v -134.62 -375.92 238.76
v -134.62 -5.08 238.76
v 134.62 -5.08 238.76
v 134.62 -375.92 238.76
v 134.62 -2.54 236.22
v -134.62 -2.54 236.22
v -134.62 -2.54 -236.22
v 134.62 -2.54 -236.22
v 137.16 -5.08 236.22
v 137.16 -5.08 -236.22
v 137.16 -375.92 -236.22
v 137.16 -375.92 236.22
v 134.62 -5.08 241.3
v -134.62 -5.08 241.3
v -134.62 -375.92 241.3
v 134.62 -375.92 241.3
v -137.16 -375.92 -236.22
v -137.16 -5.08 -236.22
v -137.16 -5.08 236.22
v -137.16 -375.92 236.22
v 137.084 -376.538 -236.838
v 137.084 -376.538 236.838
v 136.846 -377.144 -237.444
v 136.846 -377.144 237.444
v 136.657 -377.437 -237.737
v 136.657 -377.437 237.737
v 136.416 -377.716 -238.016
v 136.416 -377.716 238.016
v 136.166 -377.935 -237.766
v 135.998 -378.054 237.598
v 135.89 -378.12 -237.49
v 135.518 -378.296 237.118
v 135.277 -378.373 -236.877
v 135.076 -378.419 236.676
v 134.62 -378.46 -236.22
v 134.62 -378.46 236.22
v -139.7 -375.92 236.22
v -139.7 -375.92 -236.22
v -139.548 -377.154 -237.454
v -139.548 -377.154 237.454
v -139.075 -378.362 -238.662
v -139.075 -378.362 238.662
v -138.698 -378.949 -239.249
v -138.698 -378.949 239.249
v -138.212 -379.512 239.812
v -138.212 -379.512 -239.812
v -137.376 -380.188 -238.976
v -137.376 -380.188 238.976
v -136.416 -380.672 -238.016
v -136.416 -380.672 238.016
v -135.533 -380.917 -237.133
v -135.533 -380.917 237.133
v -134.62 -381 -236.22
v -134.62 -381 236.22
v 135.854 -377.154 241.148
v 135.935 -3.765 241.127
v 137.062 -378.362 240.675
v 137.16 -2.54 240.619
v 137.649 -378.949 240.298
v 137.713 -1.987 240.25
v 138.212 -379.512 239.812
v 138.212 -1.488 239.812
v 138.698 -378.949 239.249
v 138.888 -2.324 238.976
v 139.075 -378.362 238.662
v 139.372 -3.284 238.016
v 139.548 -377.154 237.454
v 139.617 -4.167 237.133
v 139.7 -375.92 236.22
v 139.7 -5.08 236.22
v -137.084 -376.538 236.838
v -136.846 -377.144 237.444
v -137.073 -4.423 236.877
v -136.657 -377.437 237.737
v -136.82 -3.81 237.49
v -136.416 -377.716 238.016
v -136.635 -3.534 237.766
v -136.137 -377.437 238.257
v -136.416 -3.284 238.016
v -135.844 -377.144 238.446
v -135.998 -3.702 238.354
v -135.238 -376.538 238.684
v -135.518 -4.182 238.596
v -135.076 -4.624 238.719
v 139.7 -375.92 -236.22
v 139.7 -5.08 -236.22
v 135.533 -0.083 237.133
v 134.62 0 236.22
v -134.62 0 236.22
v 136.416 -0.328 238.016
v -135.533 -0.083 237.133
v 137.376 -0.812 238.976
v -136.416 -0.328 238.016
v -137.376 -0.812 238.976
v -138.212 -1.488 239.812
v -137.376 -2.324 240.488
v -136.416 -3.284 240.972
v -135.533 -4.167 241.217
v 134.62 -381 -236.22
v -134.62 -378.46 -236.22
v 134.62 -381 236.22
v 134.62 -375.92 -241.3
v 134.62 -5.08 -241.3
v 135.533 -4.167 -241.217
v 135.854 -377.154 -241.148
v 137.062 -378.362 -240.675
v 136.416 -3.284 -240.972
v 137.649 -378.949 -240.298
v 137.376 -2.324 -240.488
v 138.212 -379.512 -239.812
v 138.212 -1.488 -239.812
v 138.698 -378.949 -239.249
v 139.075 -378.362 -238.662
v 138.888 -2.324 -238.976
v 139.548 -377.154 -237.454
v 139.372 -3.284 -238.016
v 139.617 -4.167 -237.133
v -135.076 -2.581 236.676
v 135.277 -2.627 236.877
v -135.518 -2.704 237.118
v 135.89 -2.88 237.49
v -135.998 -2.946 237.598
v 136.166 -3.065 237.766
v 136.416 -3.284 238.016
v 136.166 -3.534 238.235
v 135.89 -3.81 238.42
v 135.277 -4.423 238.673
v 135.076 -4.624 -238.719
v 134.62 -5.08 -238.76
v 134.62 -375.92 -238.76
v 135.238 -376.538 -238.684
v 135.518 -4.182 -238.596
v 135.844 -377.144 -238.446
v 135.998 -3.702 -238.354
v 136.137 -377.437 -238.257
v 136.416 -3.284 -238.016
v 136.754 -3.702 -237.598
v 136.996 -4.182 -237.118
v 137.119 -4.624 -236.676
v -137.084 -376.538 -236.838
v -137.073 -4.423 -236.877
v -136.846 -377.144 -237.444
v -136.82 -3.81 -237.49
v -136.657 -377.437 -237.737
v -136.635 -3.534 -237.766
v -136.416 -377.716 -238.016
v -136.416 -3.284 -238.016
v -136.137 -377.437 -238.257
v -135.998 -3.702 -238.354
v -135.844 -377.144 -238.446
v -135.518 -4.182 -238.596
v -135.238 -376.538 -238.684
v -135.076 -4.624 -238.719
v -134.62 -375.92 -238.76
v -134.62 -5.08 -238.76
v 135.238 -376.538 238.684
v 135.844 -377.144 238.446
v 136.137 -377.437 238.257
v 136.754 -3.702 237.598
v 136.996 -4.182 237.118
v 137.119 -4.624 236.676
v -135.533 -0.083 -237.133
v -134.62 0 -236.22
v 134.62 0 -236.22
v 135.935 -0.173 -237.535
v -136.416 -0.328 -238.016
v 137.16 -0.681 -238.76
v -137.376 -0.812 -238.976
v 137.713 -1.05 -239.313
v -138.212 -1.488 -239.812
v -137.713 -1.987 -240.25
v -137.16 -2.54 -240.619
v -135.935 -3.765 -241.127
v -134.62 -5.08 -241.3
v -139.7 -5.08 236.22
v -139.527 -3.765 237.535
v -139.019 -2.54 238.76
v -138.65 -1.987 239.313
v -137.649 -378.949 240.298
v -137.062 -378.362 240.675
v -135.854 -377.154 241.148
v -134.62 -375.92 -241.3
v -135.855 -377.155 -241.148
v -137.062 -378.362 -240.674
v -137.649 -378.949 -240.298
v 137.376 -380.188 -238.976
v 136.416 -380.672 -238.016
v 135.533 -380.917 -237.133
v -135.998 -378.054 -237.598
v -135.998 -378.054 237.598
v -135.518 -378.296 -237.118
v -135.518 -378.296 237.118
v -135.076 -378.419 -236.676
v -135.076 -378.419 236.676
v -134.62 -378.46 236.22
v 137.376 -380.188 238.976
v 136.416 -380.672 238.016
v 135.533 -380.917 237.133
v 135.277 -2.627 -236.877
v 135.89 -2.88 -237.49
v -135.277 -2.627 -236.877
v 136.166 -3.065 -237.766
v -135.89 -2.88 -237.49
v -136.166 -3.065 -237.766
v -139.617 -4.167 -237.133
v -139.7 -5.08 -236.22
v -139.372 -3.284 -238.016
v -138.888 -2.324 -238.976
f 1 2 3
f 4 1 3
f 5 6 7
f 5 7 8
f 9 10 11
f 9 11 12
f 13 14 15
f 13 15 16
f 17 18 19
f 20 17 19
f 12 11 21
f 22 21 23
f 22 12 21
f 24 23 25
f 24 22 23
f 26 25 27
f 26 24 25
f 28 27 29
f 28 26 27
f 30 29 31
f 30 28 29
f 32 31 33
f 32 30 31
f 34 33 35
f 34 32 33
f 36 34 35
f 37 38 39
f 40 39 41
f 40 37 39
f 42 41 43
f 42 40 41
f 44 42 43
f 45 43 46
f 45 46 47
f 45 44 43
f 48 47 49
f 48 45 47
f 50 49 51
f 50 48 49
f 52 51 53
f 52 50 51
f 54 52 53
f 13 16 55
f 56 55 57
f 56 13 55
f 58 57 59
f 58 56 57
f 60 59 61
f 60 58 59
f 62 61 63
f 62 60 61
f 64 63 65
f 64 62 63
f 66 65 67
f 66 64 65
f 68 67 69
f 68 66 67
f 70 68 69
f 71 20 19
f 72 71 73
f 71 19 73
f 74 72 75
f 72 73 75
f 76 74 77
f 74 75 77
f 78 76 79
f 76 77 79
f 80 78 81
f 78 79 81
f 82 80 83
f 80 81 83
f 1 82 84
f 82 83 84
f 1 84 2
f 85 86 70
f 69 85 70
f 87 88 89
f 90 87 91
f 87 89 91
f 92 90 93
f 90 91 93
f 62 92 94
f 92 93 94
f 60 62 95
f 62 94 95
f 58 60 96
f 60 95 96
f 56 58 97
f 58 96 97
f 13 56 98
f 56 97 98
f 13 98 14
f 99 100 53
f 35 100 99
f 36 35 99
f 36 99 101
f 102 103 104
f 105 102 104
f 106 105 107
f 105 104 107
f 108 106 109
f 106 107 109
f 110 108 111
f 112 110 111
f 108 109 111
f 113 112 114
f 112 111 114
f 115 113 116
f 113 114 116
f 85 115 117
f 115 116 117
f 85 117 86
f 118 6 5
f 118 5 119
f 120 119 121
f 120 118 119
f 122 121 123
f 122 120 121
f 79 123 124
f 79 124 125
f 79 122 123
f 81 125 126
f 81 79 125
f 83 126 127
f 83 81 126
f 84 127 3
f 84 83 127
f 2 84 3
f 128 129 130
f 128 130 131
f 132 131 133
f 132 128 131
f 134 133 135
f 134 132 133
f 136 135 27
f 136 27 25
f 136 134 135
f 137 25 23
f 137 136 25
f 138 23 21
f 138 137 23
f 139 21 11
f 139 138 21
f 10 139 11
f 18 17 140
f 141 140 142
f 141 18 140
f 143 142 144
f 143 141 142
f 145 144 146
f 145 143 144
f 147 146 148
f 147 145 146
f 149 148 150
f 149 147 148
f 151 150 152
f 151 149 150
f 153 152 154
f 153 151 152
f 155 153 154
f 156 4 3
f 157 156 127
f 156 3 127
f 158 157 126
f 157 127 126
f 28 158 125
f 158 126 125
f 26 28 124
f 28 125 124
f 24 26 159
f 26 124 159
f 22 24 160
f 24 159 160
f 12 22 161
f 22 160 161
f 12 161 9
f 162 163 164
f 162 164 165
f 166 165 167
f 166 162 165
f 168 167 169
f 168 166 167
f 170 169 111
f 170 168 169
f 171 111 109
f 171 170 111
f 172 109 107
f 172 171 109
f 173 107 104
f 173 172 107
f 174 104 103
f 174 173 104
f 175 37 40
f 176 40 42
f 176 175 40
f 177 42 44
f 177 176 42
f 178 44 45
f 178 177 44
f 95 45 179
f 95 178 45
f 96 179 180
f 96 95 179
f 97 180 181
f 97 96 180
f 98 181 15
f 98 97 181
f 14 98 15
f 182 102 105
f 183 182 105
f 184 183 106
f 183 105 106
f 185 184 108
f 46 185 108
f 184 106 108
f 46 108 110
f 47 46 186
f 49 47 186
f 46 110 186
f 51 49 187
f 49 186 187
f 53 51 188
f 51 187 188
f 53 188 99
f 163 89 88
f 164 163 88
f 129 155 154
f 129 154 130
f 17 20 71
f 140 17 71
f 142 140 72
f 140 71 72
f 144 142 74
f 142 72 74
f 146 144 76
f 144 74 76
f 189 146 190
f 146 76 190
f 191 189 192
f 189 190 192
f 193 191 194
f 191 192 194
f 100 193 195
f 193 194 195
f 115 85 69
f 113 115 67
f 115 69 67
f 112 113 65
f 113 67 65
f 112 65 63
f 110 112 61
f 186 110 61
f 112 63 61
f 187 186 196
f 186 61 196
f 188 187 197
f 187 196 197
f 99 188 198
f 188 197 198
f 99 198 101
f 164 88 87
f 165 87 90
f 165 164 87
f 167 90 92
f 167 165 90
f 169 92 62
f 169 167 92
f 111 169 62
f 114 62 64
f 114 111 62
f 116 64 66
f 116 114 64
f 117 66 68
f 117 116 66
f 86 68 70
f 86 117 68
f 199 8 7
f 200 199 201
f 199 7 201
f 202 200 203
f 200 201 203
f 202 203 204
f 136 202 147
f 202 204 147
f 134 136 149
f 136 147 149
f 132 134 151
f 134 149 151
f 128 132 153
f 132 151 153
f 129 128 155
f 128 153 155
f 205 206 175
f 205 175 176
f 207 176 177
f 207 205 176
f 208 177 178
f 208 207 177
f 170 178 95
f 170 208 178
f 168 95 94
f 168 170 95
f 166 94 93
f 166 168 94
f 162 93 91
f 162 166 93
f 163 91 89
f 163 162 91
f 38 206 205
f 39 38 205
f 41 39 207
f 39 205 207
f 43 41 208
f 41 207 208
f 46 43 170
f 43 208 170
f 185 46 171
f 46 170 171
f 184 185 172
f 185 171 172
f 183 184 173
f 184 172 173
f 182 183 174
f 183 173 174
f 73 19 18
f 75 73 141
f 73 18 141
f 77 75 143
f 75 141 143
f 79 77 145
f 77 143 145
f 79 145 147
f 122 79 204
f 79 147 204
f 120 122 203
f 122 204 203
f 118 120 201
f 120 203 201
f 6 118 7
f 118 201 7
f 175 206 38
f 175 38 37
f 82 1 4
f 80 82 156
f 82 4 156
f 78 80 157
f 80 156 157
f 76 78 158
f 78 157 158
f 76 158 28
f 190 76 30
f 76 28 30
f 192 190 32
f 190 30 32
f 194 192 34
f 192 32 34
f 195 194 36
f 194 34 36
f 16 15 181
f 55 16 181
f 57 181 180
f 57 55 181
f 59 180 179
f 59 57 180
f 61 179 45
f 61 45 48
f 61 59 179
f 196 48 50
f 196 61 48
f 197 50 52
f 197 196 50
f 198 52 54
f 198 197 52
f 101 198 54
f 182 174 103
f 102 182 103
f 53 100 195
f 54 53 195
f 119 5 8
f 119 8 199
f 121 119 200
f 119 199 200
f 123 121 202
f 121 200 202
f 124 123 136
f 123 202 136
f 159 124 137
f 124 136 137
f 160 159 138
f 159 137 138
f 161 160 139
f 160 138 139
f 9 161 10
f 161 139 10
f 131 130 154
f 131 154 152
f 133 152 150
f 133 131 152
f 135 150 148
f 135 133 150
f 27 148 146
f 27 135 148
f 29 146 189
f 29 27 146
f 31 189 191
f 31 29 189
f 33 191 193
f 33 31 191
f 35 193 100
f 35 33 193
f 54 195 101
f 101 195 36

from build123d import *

# Parameters (mm, degrees)
F0_W        = 279.4
F0_H        = 482.6
F1_DEPTH    = 381
F2_R        = 5.08
F3_T1_DEPTH = 401.32
F3_T3_DEPTH = 508
F4_T1_DEPTH = 299.72
F4_T3_DEPTH = 508
F5_T1_DEPTH = 396.24
F6_T        = -2.54


# Not quite as in the source:
# - a fillet or chamfer that OpenCascade refuses, or shapes differently, is made with other operations: its cross-section is extruded or revolved along the edge and cut away or added
# - a shell that OpenCascade refuses in one call is made with other operations: the cavity is built on its own and cut out


with BuildPart() as f1:
    # F0 (on Front) → F1 (new body)
    with BuildSketch(Plane.XZ):
        Rectangle(F0_W, F0_H)
    extrude(amount=F1_DEPTH)

    # F2
    f2_edges = [f1.edges().sort_by_distance(p)[0] for p in [
        (-139.7, -381, 0),
        (0, -381, -241.3),
        (139.7, -381, 0),
        (0, -381, 241.3),
    ]]
    fillet(f2_edges, radius=F2_R)

    # F3: fillet of radius 5.08 on 4 edges, made by hand

    # F3_s2 → F3_t1 (cut)
    with BuildSketch(Plane.XZ.offset(-12.7)):
        with BuildLine():
            ThreePointArc((-139.7, 236.22), (-138.2121024484, 239.8121024484), (-134.62, 241.3))
            Line((-134.62, 241.3), (-139.7, 241.3))
            Line((-139.7, 241.3), (-139.7, 236.22))
        make_face()
        with BuildLine():
            ThreePointArc((-139.7, -236.22), (-138.2121024484, -239.8121024484), (-134.62, -241.3))
            Line((-134.62, -241.3), (-139.7, -241.3))
            Line((-139.7, -241.3), (-139.7, -236.22))
        make_face()
    extrude(amount=F3_T1_DEPTH, mode=Mode.SUBTRACT)

    # F3_s4 → F3_t3 (cut)
    with BuildSketch(Plane.XY.offset(-254)):
        with BuildLine():
            ThreePointArc((-139.7, -5.08), (-138.2121024484, -1.4878975516), (-134.62, 0))
            Line((-134.62, 0), (-139.7, 0))
            Line((-139.7, 0), (-139.7, -5.08))
        make_face()
    extrude(amount=F3_T3_DEPTH, mode=Mode.SUBTRACT)

    # F4: fillet of radius 5.08 on 4 edges, made by hand

    # F4_s2 → F4_t1 (cut)
    with BuildSketch(Plane.YZ.offset(-147.32)):
        with BuildLine():
            ThreePointArc((0, 236.22), (-1.4878975516, 239.8121024484), (-5.08, 241.3))
            Line((-5.08, 241.3), (0, 241.3))
            Line((0, 241.3), (0, 236.22))
        make_face()
        with BuildLine():
            ThreePointArc((0, -236.22), (-1.4878975516, -239.8121024484), (-5.08, -241.3))
            Line((-5.08, -241.3), (0, -241.3))
            Line((0, -241.3), (0, -236.22))
        make_face()
    extrude(amount=F4_T1_DEPTH, mode=Mode.SUBTRACT)

    # F4_s4 → F4_t3 (cut)
    with BuildSketch(Plane.XY.offset(-254)):
        with BuildLine():
            ThreePointArc((134.62, 0), (138.2121024484, -1.4878975516), (139.7, -5.08))
            Line((139.7, -5.08), (139.7, 0))
            Line((139.7, 0), (134.62, 0))
        make_face()
    extrude(amount=F4_T3_DEPTH, mode=Mode.SUBTRACT)

    # F5: fillet of radius 5.08 on 4 edges, made by hand

    # F5_s2 → F5_t1 (cut)
    with BuildSketch(Plane.XZ.offset(-7.62)):
        with BuildLine():
            ThreePointArc((134.62, 241.3), (138.2121024484, 239.8121024484), (139.7, 236.22))
            Line((139.7, 236.22), (139.7, 241.3))
            Line((139.7, 241.3), (134.62, 241.3))
        make_face()
        with BuildLine():
            ThreePointArc((134.62, -241.3), (138.2121024484, -239.8121024484), (139.7, -236.22))
            Line((139.7, -236.22), (139.7, -241.3))
            Line((139.7, -241.3), (134.62, -241.3))
        make_face()
    extrude(amount=F5_T1_DEPTH, mode=Mode.SUBTRACT)

    # F6: a shell. OpenCascade refuses it in one call, so the cavity is built on its own and cut out:
    # the body offset inwards by the wall thickness, plus a prism from it out through each open face.
    f6_core = offset(f1.part, amount=F6_T, mode=Mode.PRIVATE)
    f6_exits = [f6_core.faces().sort_by_distance(p)[0] for p in [
        (0, -378.46, 0),
    ]]
    add(f6_core, mode=Mode.SUBTRACT)
    extrude(f6_exits, amount=-F6_T, mode=Mode.SUBTRACT)


solid = f1.part
